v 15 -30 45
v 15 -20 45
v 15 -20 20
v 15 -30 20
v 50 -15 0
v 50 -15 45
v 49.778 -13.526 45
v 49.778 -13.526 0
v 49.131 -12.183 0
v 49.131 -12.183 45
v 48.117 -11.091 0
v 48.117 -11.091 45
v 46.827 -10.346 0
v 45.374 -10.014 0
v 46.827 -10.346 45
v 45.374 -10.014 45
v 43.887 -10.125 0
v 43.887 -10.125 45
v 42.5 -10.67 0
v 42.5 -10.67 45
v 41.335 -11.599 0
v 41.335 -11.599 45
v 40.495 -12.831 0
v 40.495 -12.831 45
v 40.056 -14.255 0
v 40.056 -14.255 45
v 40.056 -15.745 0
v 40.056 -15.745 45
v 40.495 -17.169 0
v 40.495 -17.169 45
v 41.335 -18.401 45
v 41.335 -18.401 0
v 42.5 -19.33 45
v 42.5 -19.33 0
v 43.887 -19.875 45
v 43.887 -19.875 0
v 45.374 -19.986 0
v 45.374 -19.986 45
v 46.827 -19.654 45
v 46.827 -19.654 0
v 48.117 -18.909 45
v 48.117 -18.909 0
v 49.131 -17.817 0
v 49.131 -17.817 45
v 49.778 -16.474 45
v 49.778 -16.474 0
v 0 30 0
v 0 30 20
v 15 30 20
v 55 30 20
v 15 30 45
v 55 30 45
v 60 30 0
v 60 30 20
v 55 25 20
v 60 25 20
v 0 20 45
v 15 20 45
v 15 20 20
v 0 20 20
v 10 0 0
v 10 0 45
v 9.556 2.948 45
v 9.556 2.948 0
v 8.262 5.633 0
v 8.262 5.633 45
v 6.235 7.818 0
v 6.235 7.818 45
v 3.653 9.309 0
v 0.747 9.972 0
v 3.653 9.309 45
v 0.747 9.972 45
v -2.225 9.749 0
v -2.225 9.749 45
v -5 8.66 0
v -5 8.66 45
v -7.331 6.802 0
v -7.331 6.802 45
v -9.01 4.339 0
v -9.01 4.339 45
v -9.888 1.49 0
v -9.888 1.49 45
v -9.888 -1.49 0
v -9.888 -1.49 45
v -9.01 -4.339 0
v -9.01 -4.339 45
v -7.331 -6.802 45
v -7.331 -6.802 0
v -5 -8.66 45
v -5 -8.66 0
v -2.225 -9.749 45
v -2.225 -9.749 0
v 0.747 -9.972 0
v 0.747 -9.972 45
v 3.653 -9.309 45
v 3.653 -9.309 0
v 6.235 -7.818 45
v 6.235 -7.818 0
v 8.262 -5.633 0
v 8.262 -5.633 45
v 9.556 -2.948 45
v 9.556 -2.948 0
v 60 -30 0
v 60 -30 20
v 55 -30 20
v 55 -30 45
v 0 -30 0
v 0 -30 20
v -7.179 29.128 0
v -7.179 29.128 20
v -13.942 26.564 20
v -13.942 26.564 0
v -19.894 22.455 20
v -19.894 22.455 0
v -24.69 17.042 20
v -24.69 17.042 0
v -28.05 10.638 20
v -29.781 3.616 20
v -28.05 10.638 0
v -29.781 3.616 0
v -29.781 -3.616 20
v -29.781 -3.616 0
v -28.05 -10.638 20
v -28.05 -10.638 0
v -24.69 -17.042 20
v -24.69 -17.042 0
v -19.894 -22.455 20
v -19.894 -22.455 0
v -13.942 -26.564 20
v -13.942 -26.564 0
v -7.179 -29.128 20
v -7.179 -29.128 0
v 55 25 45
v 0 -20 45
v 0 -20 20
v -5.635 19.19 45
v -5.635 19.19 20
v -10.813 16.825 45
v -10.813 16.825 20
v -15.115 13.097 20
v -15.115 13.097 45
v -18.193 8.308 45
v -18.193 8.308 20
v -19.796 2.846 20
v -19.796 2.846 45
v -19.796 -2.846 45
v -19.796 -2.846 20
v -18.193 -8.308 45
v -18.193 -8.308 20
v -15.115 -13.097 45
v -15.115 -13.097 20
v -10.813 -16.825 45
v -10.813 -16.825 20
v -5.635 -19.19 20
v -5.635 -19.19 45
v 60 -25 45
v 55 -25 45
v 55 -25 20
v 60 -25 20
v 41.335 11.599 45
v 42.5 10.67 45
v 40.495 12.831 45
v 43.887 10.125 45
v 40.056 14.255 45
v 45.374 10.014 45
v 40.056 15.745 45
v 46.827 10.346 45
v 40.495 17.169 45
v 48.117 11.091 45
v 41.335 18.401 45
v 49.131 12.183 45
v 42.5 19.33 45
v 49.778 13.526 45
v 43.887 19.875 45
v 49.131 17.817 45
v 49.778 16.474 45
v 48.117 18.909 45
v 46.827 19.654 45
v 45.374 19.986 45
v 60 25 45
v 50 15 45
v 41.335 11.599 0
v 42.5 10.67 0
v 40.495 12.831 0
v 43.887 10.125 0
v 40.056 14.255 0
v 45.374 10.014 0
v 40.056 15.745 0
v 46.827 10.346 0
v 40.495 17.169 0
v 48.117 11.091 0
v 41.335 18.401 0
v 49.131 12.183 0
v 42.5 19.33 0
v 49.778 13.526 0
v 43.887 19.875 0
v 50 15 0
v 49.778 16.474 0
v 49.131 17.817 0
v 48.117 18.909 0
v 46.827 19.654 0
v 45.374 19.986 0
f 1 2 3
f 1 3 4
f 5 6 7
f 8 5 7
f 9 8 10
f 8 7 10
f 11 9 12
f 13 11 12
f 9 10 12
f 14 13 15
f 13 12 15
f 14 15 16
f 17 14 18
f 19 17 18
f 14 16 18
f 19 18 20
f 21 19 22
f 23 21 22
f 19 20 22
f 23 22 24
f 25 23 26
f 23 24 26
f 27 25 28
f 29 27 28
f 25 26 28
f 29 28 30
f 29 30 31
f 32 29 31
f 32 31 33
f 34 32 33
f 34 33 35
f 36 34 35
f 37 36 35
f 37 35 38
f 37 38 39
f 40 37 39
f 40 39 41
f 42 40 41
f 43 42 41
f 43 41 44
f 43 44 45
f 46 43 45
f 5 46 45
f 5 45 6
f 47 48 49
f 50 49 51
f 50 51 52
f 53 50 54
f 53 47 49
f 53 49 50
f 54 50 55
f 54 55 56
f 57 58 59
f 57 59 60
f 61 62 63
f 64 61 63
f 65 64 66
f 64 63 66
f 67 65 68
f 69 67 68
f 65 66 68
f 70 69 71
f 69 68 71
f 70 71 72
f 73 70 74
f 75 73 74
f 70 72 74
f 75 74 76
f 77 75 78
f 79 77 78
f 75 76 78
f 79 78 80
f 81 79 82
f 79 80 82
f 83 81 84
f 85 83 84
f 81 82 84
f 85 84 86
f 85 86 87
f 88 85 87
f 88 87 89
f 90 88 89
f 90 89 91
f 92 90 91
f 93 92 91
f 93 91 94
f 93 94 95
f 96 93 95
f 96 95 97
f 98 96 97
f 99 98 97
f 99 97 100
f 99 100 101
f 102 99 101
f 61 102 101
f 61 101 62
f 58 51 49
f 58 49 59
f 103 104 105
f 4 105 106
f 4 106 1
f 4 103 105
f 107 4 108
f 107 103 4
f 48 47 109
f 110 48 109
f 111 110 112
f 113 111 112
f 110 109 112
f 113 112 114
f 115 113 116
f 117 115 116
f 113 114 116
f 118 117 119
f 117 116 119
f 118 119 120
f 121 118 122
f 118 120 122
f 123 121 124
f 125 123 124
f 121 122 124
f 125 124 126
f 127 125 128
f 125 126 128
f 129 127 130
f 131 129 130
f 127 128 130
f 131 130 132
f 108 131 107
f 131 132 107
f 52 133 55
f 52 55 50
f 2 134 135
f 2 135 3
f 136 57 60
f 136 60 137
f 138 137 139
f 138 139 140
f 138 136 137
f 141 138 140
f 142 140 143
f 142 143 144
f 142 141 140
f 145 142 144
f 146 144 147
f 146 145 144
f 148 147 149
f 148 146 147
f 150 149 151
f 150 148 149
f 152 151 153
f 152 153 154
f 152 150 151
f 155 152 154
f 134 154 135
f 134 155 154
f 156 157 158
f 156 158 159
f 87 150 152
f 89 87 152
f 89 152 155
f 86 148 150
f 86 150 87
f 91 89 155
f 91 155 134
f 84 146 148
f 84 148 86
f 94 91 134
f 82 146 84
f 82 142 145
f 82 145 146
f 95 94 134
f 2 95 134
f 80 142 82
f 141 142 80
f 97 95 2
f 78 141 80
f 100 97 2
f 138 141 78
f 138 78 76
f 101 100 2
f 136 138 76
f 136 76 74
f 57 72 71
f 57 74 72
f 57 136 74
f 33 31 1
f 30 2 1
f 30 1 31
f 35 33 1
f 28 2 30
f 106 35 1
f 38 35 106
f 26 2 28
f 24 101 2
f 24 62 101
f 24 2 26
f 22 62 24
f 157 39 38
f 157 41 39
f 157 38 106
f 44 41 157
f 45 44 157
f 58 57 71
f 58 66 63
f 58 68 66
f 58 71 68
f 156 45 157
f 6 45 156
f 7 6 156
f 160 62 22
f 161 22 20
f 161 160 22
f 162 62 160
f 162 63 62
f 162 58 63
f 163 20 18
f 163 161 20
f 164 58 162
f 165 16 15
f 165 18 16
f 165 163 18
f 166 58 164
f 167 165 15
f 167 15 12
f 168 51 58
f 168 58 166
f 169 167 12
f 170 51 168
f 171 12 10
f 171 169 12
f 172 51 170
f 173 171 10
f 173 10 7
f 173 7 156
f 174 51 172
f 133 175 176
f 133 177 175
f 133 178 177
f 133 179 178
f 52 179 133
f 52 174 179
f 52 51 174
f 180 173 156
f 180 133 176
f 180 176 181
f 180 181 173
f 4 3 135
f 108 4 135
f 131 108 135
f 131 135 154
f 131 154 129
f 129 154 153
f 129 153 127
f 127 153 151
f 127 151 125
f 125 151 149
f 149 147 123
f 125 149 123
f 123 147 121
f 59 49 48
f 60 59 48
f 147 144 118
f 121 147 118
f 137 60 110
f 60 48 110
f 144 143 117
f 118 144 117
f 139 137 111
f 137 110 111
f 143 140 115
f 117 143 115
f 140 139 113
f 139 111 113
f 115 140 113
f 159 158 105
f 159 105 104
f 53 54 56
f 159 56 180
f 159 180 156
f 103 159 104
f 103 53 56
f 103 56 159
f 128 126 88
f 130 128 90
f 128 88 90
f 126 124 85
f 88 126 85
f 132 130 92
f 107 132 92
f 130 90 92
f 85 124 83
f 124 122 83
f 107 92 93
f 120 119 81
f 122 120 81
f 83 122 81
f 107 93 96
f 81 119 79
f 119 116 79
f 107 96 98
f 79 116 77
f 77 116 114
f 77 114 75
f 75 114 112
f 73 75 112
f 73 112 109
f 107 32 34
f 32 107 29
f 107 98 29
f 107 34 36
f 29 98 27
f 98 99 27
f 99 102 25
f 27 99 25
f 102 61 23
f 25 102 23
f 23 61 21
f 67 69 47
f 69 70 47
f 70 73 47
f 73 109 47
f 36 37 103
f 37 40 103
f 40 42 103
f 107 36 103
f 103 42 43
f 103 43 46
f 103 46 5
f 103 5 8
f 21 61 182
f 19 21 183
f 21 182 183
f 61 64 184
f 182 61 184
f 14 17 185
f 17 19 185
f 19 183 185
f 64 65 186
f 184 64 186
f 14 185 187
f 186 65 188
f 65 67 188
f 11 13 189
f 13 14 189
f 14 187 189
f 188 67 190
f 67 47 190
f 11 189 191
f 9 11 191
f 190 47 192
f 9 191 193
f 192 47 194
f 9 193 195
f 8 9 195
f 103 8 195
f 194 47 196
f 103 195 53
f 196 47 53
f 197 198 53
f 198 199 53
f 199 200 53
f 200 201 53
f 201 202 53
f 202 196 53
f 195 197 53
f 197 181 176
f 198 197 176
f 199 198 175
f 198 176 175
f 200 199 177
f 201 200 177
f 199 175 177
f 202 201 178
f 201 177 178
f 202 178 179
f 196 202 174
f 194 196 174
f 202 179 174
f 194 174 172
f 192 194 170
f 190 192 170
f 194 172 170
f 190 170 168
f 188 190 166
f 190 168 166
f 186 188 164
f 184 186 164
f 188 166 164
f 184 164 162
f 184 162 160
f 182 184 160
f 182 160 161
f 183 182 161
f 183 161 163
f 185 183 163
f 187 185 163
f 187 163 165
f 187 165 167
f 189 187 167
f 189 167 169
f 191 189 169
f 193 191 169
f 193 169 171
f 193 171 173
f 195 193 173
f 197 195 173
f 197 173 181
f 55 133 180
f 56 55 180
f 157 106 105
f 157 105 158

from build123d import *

# Parameters (mm, degrees)
PAD_DEPTH       = 45
SKETCH001_W     = 5
SKETCH001_H     = 5
POCKET_DEPTH    = 25
SKETCH002_R     = 10
SKETCH002_R_2   = 5
POCKET001_DEPTH = 45.001


with BuildPart() as part:
    # Sketch → Pad (new body)
    with BuildSketch(Plane.XY):
        with BuildLine():
            ThreePointArc((0, 30), (-30, 0), (0, -30))
            Line((60, -30), (0, -30))
            Line((60, 30), (60, -30))
            Line((0, 30), (60, 30))
        make_face()
    extrude(amount=PAD_DEPTH)

    # Sketch001 (on Face6 of Pad) → Pocket (cut)
    with BuildSketch(Plane.XY.offset(45)):
        with BuildLine():
            ThreePointArc((0, 20), (-20, 0), (0, -20))
            Line((0, -20), (15, -20))
            Line((15, -20), (15, -30))
            Line((15, -30), (0, -30))
            ThreePointArc((0, 30), (-30, 0), (0, -30))
            Line((0, 30), (15, 30))
            Line((15, 30), (15, 20))
            Line((15, 20), (0, 20))
        make_face()
        with Locations((57.5, 27.5)):
            Rectangle(SKETCH001_W, SKETCH001_H)
        with Locations((57.5, -27.5)):
            Rectangle(SKETCH001_W, SKETCH001_H)
    extrude(amount=-POCKET_DEPTH, mode=Mode.SUBTRACT)

    # Sketch002 (on Face8 of Pocket) → Pocket001 (cut, through all)
    with BuildSketch(Plane.XY.offset(45)):
        Circle(SKETCH002_R)
        with Locations((45, 15)):
            Circle(SKETCH002_R_2)
        with Locations((45, -15)):
            Circle(SKETCH002_R_2)
    extrude(amount=-POCKET001_DEPTH, mode=Mode.SUBTRACT)


solid = part.part
